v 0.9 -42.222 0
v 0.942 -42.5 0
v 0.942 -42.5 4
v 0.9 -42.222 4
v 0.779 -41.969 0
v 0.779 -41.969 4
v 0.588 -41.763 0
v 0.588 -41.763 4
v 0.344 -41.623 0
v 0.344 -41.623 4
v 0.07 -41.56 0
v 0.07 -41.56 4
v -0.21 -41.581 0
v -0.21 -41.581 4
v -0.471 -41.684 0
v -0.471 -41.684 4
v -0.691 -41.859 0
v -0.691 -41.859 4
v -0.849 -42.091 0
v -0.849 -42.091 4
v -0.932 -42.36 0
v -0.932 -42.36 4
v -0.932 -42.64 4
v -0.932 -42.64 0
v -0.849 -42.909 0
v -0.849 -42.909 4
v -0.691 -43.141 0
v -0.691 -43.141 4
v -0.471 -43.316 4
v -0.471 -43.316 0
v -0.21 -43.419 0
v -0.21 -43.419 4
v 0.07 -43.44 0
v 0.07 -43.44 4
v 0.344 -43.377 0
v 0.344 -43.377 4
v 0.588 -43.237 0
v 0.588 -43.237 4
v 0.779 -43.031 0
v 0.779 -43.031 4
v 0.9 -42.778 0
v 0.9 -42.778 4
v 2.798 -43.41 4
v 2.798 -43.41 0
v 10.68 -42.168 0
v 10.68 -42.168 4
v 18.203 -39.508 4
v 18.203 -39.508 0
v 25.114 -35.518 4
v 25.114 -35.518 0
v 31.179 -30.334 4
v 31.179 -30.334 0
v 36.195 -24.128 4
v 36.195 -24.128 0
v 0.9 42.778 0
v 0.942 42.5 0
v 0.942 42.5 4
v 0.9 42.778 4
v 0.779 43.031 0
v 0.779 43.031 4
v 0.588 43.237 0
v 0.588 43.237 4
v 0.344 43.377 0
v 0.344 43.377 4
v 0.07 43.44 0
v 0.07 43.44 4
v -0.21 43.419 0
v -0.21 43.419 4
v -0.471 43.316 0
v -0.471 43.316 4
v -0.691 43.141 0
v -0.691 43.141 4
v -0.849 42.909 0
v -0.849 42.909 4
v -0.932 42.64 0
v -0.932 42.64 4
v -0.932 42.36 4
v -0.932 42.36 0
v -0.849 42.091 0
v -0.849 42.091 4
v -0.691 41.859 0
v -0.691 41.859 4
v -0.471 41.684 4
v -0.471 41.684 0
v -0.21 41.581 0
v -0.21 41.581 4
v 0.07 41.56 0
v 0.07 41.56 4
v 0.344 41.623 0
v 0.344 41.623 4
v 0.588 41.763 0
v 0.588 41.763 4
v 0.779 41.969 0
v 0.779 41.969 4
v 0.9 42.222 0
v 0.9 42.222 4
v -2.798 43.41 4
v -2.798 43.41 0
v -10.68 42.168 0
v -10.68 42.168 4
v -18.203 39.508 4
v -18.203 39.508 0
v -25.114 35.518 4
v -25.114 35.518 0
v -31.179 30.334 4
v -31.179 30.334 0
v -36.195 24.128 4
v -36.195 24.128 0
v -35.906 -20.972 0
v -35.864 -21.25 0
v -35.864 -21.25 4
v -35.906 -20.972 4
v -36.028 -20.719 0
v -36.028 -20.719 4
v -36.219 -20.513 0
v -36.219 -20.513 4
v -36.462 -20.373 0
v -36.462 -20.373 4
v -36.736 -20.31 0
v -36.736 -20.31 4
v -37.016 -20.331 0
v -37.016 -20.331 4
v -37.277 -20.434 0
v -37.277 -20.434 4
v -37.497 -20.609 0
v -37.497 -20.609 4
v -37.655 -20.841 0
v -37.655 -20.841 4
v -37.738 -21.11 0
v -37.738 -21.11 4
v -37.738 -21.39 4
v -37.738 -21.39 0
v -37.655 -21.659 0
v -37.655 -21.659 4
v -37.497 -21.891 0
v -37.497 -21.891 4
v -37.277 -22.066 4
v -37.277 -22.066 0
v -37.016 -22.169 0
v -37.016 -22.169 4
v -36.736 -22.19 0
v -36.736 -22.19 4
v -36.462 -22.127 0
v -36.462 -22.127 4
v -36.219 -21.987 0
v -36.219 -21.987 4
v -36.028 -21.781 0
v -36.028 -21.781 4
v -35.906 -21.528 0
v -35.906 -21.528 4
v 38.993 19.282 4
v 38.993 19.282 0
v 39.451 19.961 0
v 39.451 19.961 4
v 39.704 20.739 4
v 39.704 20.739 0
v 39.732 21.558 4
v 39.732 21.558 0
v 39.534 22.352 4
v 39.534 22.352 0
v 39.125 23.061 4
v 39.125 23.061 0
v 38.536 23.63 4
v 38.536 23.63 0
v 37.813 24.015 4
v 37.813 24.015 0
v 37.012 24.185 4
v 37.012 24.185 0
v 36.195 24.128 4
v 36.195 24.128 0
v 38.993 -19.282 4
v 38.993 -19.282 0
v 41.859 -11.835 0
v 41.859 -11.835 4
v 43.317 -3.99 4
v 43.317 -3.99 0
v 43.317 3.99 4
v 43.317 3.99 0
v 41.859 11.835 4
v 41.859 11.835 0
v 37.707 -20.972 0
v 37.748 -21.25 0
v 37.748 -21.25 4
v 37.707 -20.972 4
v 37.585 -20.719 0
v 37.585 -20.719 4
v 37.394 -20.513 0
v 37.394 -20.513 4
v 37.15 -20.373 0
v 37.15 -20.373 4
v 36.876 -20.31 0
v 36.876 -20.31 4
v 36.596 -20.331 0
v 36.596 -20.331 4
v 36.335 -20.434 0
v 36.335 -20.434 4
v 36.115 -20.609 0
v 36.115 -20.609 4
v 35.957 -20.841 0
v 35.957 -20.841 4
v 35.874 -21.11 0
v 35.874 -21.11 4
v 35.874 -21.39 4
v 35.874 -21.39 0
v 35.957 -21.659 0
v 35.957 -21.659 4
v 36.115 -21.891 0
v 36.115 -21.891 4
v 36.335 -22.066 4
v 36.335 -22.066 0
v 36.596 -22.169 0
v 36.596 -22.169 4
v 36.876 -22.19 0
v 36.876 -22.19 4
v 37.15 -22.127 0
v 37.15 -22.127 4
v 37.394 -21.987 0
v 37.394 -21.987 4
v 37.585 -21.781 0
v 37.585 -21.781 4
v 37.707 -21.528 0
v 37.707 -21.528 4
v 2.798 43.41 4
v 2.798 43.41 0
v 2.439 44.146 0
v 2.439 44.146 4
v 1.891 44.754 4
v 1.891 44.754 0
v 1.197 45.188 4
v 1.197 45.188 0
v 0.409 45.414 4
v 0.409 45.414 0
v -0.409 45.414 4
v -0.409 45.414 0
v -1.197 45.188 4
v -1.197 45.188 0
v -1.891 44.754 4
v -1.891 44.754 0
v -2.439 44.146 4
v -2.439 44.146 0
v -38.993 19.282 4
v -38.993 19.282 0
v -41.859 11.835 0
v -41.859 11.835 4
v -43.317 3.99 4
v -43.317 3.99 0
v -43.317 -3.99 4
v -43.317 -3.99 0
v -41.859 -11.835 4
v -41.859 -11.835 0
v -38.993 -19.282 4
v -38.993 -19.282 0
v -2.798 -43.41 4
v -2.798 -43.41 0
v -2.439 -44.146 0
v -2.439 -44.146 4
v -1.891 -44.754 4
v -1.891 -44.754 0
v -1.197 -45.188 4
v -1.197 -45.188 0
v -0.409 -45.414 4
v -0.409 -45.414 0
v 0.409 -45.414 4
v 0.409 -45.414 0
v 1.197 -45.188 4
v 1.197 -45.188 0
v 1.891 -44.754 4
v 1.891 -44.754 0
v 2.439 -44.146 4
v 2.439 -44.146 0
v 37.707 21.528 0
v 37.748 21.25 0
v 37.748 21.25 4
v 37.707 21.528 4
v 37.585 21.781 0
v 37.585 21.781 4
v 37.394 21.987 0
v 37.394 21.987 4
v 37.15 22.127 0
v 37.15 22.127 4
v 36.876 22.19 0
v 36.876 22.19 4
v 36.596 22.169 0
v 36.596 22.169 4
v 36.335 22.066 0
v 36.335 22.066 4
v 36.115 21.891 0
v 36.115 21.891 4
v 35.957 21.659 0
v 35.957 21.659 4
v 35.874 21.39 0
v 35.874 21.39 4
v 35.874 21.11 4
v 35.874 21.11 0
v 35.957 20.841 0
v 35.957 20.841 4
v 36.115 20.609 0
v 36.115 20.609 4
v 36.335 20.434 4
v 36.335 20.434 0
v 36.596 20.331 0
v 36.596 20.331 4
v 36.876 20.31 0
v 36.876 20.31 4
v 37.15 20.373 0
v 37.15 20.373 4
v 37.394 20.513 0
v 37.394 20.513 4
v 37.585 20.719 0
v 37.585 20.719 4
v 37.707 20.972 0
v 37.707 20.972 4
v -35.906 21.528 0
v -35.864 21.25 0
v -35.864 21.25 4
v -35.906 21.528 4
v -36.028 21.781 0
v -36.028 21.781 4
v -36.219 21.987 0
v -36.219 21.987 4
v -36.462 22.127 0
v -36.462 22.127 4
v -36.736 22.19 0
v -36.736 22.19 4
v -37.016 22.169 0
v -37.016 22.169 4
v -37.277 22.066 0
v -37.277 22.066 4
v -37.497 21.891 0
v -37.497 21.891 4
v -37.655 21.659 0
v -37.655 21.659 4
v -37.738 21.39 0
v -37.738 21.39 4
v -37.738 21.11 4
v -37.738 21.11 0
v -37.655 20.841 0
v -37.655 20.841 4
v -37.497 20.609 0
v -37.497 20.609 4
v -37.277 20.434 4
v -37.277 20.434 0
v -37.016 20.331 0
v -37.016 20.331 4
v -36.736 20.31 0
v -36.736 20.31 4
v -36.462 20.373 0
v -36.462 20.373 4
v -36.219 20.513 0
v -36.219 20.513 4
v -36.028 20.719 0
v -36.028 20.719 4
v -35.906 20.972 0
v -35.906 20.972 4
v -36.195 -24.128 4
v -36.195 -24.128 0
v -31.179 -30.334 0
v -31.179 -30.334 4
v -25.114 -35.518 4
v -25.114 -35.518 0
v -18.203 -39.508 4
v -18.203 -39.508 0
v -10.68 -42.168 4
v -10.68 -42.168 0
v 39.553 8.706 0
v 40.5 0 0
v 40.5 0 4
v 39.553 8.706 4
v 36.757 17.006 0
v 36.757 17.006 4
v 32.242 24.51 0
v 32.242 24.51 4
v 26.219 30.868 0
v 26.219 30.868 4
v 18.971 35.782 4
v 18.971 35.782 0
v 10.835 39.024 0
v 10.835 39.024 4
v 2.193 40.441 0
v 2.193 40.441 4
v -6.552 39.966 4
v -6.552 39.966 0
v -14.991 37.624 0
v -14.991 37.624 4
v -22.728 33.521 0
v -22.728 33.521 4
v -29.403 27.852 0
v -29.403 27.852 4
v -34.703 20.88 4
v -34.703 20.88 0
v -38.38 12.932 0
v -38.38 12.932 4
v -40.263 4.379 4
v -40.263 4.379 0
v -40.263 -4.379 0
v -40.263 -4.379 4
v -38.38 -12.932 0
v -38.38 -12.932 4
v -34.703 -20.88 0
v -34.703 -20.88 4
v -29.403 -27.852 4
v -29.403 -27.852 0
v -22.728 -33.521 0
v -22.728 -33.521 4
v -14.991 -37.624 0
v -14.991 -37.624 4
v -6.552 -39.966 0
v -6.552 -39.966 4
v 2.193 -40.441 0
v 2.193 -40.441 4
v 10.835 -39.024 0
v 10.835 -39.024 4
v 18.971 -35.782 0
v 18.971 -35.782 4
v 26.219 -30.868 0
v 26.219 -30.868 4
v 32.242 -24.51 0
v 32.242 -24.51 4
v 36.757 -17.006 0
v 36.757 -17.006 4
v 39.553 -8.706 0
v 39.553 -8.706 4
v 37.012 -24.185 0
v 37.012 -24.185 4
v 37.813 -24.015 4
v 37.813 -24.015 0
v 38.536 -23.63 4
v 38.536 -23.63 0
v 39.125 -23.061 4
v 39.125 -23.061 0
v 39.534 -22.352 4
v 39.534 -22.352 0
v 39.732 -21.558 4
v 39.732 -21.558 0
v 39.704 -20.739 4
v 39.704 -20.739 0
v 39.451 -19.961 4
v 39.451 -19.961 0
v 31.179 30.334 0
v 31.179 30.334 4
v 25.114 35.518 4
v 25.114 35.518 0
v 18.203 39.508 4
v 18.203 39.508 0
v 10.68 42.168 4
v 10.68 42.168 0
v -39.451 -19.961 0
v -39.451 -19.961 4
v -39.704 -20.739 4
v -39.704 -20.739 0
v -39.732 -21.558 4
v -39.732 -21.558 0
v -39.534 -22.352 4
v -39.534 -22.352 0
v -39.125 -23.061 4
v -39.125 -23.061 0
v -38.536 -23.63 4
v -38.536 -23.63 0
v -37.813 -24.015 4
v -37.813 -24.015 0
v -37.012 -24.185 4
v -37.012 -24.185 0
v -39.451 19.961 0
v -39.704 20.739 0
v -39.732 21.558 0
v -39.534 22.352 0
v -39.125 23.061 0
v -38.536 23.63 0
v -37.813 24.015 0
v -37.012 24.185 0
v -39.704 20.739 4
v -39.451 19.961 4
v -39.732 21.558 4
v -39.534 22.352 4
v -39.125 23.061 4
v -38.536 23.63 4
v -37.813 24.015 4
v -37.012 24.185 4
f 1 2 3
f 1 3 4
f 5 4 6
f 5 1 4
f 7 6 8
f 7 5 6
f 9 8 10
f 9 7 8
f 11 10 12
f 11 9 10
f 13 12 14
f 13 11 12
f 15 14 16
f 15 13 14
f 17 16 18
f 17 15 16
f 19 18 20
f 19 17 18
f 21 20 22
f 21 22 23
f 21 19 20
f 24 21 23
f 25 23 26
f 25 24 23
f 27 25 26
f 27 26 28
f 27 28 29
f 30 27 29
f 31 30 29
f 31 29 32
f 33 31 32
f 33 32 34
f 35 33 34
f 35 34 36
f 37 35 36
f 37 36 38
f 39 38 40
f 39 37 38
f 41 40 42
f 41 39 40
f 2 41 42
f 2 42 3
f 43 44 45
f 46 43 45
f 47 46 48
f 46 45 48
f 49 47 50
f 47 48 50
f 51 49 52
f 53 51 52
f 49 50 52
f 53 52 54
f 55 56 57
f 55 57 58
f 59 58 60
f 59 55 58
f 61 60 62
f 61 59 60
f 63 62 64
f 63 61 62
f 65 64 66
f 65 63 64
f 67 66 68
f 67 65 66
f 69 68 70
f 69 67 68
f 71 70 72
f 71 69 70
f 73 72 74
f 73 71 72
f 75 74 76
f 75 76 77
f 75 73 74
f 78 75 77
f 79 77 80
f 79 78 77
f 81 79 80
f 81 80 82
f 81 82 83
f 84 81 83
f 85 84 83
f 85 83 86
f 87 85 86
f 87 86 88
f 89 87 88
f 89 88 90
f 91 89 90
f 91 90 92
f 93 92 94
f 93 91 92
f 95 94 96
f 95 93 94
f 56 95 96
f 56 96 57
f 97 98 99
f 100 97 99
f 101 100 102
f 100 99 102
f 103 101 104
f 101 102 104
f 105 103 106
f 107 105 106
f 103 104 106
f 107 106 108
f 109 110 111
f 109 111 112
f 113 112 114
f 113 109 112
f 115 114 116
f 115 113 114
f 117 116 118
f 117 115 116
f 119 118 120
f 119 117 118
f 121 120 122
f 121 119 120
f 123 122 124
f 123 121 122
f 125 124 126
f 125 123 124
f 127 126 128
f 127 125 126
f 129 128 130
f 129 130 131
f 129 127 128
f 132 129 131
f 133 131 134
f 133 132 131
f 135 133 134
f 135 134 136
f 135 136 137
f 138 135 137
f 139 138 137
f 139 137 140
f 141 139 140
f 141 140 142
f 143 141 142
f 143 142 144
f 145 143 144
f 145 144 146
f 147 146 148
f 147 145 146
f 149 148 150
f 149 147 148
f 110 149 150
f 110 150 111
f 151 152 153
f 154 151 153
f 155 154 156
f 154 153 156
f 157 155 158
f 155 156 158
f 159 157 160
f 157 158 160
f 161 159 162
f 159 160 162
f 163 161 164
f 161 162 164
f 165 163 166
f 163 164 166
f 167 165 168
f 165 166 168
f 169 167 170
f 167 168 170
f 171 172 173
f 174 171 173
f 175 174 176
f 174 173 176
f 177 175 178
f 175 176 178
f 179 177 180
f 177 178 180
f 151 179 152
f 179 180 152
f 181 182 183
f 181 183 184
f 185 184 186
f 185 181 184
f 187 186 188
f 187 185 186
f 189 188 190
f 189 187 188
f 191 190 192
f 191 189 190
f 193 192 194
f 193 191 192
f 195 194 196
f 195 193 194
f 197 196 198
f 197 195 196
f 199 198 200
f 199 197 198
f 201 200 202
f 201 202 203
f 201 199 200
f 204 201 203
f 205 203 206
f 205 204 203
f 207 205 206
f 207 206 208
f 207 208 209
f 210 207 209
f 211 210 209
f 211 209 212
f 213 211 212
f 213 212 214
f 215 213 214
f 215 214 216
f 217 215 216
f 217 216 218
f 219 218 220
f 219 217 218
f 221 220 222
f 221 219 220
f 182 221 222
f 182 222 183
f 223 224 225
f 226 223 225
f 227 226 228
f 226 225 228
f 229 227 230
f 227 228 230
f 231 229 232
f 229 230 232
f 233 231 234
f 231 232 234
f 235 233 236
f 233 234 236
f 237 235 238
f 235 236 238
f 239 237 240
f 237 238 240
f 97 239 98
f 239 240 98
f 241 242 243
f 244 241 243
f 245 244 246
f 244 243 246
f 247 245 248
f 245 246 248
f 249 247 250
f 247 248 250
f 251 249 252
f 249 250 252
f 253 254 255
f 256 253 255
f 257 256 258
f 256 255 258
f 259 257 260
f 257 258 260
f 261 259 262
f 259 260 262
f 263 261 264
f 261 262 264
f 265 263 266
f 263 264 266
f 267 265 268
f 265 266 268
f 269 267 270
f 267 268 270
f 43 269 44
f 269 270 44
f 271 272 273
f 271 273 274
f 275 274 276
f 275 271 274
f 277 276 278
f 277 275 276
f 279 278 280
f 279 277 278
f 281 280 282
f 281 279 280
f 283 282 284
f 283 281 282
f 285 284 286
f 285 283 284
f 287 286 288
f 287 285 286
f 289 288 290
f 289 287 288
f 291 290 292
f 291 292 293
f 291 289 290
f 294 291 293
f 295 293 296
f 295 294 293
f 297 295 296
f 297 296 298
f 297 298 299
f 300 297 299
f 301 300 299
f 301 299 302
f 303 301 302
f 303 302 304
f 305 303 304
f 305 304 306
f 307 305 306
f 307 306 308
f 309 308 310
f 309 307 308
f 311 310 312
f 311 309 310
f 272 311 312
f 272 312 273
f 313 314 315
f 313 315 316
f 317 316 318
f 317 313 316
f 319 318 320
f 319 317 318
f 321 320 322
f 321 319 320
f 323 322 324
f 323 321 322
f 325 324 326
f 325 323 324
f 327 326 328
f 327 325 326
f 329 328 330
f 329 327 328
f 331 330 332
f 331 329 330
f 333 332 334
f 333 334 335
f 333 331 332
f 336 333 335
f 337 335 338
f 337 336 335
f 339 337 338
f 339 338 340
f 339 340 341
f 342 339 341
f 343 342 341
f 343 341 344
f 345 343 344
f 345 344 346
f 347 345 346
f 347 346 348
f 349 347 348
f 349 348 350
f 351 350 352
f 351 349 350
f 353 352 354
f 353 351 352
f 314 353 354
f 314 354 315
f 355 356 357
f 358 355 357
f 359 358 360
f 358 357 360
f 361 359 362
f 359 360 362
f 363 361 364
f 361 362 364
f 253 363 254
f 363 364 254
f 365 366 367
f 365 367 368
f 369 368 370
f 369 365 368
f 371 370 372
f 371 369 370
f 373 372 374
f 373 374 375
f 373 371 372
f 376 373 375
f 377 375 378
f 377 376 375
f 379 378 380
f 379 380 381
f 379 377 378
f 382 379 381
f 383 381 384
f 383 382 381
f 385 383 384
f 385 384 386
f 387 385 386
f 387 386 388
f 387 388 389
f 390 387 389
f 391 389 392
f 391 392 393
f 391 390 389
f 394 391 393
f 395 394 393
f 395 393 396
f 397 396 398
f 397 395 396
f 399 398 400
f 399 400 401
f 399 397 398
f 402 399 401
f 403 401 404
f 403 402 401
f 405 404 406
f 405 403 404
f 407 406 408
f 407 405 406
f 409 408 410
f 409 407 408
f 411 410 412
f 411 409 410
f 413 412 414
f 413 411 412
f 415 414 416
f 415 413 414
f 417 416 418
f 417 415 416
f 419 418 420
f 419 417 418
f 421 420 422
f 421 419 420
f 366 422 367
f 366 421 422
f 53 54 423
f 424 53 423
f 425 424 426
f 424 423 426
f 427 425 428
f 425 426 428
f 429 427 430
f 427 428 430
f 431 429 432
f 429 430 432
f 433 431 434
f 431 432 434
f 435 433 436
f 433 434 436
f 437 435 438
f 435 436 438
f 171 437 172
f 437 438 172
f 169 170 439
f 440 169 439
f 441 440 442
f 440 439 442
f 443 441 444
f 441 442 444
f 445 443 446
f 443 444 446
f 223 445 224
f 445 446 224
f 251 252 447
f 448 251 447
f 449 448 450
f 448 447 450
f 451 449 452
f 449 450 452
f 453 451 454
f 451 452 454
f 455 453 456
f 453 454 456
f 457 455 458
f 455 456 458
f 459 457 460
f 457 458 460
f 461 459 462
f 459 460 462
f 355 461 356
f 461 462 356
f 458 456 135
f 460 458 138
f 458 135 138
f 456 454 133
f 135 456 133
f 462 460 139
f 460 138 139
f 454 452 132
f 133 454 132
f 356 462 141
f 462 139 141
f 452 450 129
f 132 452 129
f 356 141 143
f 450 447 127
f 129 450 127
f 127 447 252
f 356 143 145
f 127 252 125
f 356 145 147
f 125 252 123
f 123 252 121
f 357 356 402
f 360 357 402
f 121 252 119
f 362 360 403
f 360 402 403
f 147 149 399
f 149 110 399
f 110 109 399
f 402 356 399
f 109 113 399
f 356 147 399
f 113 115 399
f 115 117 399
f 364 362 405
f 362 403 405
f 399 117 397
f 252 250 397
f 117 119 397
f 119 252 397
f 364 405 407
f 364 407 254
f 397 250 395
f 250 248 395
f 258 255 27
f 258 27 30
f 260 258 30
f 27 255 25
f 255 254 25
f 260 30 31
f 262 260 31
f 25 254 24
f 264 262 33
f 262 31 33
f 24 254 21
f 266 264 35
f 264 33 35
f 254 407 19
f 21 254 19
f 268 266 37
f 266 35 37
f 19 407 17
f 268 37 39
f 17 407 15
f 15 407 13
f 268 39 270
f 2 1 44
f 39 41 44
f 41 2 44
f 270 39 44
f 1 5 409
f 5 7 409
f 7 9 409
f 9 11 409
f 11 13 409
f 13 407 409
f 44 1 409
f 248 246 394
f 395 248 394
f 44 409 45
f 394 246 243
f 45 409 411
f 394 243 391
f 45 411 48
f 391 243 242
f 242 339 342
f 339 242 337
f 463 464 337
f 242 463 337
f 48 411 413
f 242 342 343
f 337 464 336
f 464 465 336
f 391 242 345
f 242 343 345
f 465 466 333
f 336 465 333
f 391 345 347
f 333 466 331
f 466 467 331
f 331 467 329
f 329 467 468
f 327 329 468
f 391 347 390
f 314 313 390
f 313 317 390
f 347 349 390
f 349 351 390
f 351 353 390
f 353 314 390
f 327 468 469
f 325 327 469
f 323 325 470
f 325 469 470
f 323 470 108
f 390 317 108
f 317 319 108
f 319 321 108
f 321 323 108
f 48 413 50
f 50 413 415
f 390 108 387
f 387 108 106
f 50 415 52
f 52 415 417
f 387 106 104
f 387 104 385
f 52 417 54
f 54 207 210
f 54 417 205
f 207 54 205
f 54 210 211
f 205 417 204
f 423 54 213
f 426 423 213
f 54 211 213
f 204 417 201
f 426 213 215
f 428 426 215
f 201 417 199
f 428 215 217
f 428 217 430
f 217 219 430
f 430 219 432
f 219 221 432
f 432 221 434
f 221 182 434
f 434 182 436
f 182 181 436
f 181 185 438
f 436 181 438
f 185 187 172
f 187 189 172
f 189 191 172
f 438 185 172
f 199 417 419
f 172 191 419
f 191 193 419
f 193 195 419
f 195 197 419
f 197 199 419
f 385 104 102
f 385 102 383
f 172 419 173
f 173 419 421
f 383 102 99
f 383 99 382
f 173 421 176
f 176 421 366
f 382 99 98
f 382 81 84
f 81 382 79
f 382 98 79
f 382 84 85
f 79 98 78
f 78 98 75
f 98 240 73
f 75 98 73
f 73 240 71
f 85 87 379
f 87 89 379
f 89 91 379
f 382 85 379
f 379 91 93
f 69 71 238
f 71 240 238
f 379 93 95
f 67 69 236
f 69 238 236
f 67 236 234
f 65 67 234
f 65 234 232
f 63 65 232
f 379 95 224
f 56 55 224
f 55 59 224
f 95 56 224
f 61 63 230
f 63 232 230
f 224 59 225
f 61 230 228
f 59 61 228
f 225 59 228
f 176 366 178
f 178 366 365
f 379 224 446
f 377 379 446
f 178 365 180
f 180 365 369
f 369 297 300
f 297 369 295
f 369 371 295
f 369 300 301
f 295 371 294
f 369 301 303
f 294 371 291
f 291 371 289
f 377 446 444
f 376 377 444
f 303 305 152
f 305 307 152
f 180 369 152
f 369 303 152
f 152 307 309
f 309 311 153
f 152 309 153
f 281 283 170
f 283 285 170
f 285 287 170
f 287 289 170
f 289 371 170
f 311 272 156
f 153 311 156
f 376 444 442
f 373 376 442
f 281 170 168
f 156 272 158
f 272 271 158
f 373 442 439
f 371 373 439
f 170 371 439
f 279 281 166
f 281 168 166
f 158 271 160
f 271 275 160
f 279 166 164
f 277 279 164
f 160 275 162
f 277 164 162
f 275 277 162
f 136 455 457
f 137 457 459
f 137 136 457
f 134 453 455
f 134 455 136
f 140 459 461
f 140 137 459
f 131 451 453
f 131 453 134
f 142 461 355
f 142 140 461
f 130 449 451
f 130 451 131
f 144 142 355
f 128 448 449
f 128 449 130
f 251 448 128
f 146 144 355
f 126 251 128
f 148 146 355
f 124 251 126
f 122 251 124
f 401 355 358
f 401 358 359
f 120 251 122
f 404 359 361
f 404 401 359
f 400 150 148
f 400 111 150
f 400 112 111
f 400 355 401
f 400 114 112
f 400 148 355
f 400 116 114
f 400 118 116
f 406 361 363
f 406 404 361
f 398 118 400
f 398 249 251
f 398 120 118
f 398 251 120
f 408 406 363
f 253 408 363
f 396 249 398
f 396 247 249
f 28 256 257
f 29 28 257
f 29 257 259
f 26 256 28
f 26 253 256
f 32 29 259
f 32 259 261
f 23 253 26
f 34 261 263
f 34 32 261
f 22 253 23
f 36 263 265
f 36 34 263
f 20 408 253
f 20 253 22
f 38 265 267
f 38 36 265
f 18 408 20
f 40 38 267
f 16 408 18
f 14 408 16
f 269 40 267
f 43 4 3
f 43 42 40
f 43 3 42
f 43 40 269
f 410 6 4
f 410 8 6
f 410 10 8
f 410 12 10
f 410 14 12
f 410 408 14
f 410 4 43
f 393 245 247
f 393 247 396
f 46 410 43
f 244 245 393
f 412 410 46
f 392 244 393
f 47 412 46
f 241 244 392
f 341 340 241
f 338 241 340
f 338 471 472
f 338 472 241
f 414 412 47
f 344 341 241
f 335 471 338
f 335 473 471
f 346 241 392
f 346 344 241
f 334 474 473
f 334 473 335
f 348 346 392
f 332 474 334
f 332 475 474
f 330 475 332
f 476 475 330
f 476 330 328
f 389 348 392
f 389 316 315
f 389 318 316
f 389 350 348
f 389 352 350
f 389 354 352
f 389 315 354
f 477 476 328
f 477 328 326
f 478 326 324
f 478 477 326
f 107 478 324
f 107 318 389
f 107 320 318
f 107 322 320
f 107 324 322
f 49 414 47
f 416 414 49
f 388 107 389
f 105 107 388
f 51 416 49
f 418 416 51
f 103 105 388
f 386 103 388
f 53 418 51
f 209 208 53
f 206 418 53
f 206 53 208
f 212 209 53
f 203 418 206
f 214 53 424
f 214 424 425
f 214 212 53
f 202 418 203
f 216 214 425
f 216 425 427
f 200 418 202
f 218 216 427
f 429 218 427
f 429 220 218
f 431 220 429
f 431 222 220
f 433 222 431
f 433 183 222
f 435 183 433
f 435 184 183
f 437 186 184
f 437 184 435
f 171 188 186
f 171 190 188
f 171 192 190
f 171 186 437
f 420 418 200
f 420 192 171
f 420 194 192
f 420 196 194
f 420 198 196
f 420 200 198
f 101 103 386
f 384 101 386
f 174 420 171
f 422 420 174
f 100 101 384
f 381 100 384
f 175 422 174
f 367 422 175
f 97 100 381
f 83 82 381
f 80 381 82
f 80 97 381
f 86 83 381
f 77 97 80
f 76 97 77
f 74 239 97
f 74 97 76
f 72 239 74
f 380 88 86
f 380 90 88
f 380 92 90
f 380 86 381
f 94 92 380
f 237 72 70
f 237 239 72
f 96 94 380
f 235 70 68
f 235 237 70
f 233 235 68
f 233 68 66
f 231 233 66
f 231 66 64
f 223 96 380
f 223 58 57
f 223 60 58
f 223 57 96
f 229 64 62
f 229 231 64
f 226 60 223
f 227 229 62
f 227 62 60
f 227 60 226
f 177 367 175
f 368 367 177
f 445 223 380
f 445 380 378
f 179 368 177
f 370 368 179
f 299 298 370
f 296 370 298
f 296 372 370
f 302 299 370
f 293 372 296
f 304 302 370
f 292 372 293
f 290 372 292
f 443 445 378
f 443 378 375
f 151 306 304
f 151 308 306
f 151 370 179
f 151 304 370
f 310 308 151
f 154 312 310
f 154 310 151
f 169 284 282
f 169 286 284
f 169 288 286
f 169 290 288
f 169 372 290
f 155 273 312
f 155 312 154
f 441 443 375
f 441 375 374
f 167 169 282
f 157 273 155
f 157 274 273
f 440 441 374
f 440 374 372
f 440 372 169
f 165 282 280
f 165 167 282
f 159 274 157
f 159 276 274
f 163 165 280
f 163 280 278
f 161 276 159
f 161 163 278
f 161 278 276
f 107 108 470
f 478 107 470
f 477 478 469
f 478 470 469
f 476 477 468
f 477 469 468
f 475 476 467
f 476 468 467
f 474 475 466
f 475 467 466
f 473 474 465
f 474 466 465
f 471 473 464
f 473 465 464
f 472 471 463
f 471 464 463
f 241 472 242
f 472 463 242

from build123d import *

# Parameters (mm, degrees)
F0_R     = 0.942302
F0_R_2   = 40.5
F1_DEPTH = 4


with BuildPart() as f1:
    # F0 (on Top) → F1 (new body)
    with BuildSketch(Plane.XY):
        with BuildLine():
            ThreePointArc((2.79807, 43.409916), (0, 45.442302), (-2.79807, 43.409916))
            ThreePointArc((-2.79807, 43.409916), (-21.75, 37.672105), (-36.195055, 24.128158))
            ThreePointArc((-36.195055, 24.128158), (-39.354188, 22.721151), (-38.993125, 19.281758))
            ThreePointArc((-38.993125, 19.281758), (-43.5, 0), (-38.993125, -19.281758))
            ThreePointArc((-38.993125, -19.281758), (-39.354188, -22.721151), (-36.195055, -24.128158))
            ThreePointArc((-36.195055, -24.128158), (-21.75, -37.672105), (-2.79807, -43.409916))
            ThreePointArc((-2.79807, -43.409916), (0, -45.442302), (2.79807, -43.409916))
            ThreePointArc((2.79807, -43.409916), (21.75, -37.672105), (36.195055, -24.128158))
            ThreePointArc((36.195055, -24.128158), (39.354188, -22.721151), (38.993125, -19.281758))
            ThreePointArc((38.993125, -19.281758), (43.5, 0), (38.993125, 19.281758))
            ThreePointArc((38.993125, 19.281758), (39.354188, 22.721151), (36.195055, 24.128158))
            ThreePointArc((36.195055, 24.128158), (21.75, 37.672105), (2.79807, 43.409916))
        make_face()
        with Locations((-36.80608, -21.25)):
            Circle(F0_R, mode=Mode.SUBTRACT)
        with Locations((0, -42.5)):
            Circle(F0_R, mode=Mode.SUBTRACT)
        with Locations((36.80608, -21.25)):
            Circle(F0_R, mode=Mode.SUBTRACT)
        with Locations((-36.80608, 21.25)):
            Circle(F0_R, mode=Mode.SUBTRACT)
        Circle(F0_R_2, mode=Mode.SUBTRACT)
        with Locations((36.80608, 21.25)):
            Circle(F0_R, mode=Mode.SUBTRACT)
        with Locations((0, 42.5)):
            Circle(F0_R, mode=Mode.SUBTRACT)
    extrude(amount=F1_DEPTH)


solid = f1.part
